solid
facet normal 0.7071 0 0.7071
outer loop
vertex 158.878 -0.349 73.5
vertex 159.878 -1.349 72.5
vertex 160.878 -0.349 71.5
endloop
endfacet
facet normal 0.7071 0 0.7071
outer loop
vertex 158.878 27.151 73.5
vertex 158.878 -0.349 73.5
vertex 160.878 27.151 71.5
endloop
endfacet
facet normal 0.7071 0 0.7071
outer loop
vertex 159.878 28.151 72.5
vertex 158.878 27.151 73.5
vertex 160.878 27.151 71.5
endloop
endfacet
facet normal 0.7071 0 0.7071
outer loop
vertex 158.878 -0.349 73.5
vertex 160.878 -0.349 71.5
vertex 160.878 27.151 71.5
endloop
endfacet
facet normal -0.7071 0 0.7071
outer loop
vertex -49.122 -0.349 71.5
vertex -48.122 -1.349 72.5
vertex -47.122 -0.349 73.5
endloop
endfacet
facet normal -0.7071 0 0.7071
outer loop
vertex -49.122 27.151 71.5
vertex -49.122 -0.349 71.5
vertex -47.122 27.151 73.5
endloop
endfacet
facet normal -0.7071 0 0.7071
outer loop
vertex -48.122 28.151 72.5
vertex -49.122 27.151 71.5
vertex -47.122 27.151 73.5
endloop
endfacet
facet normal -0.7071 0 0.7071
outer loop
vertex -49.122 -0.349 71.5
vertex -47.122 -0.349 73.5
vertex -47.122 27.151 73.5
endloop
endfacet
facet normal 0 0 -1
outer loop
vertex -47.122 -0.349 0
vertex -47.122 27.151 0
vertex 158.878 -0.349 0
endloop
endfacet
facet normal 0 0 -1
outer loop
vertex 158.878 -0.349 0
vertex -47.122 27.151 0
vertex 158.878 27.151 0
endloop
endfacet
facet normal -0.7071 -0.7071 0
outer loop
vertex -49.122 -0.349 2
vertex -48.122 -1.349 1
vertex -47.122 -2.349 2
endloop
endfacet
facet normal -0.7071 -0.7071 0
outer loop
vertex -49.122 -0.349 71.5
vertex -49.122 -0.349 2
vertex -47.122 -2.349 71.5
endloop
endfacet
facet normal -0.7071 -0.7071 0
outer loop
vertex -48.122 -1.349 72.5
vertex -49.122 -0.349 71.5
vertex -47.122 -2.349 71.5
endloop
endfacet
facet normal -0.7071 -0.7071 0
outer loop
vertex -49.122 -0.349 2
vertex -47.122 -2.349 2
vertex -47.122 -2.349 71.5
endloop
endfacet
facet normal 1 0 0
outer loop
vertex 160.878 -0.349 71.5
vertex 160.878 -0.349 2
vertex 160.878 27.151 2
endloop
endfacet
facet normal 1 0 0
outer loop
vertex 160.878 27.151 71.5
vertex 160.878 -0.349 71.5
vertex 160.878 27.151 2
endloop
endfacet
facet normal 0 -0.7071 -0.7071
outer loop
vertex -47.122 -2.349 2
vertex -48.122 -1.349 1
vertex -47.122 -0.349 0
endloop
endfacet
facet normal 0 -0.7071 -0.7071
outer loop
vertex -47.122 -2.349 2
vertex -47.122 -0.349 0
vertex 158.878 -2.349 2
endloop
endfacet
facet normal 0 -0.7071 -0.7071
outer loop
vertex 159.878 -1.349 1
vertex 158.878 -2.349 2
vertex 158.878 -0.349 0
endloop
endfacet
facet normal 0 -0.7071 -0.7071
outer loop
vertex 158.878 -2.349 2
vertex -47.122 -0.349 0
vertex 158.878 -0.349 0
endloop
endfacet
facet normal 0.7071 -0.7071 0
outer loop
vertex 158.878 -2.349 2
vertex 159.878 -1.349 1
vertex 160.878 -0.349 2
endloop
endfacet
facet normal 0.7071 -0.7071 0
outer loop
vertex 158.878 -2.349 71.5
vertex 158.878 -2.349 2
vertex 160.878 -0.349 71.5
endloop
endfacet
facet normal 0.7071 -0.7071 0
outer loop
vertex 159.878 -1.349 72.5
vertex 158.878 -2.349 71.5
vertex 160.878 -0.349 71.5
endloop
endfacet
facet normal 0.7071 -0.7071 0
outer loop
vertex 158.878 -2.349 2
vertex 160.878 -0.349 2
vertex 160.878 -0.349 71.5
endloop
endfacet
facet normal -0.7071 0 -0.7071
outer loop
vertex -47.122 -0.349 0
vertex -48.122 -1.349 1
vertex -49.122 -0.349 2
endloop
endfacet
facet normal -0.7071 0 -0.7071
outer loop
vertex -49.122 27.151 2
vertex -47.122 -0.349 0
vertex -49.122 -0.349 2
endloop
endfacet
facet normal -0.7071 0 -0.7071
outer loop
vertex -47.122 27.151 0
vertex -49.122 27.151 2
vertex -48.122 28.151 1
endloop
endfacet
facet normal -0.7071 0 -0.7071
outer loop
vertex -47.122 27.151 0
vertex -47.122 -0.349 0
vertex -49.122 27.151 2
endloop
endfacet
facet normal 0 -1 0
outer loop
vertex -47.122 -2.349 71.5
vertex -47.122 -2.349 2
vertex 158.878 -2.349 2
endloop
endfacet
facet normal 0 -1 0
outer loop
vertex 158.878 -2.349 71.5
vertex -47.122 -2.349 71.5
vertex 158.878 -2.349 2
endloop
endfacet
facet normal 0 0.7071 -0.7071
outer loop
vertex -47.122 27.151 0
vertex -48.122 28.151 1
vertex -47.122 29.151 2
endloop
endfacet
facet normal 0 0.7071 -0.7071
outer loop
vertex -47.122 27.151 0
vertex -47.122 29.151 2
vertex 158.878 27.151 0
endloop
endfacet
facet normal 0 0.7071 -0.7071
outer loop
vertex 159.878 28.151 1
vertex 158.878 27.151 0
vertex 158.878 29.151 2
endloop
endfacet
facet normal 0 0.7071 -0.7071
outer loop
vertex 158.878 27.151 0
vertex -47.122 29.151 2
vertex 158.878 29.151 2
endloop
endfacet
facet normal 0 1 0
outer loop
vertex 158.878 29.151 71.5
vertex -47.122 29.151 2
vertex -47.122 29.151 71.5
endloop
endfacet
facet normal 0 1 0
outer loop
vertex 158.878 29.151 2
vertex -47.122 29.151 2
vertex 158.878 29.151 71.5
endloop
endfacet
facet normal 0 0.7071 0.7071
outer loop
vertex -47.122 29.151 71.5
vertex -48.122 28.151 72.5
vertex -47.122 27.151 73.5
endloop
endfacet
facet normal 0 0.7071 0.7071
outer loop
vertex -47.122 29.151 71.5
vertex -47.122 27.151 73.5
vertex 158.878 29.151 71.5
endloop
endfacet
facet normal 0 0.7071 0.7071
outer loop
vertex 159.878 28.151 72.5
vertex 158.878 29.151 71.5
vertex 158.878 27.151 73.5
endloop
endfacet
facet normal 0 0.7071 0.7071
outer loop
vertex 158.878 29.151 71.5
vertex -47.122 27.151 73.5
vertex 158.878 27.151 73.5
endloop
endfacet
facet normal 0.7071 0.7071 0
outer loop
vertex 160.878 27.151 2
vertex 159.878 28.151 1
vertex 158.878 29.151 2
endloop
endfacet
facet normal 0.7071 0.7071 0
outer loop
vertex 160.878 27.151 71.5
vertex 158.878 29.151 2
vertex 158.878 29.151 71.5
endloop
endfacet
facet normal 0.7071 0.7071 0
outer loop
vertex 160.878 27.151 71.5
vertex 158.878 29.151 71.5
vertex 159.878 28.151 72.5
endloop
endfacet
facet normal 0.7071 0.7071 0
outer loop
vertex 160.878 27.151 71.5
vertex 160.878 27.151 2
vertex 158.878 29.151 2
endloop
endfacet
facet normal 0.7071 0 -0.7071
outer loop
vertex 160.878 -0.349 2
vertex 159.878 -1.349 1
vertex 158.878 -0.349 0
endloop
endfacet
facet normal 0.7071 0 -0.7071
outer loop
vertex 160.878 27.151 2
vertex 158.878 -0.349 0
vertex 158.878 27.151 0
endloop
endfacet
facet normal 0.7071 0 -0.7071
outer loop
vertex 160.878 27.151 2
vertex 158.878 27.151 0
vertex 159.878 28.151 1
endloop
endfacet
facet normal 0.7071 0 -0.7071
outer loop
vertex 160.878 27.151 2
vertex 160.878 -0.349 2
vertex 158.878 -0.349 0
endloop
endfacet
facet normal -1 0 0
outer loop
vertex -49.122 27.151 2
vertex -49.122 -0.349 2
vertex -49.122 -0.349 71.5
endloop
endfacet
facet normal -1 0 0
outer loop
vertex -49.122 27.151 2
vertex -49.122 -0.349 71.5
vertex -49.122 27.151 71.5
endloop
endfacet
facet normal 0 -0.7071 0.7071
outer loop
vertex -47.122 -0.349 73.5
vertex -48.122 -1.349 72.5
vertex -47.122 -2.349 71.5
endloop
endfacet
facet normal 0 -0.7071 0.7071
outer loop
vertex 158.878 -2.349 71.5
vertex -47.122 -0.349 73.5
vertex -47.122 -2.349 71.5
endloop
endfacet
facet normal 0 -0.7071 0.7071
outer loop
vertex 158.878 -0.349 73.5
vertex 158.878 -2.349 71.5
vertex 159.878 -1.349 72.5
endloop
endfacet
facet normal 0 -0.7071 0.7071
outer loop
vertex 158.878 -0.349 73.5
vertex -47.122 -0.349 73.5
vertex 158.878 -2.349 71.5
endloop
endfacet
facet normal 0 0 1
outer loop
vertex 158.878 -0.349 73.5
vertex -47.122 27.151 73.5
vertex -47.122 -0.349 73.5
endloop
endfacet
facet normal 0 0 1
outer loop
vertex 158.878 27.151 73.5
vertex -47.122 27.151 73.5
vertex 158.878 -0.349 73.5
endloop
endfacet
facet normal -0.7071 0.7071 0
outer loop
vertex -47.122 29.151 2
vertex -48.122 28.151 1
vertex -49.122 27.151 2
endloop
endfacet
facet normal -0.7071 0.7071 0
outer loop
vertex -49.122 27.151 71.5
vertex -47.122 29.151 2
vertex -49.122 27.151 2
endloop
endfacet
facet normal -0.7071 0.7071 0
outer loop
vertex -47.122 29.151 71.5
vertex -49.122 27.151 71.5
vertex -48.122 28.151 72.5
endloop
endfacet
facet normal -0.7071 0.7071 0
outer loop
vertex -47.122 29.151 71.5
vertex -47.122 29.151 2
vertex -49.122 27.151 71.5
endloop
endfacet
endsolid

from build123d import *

# Parameters (mm, degrees)
ESQUISSE1_W      = 210
ESQUISSE1_H      = 31.5
EXTRUSION1_DEPTH = 73.5
CHANFREIN1_SIZE  = 2
CHANFREIN2_SIZE  = 2
CHANFREIN3_SIZE  = 2


with BuildPart() as part:
    # Esquisse1 → Extrusion1 (new body)
    with BuildSketch(Plane.XY):
        with Locations((55.878134685, 13.401054852)):
            Rectangle(ESQUISSE1_W, ESQUISSE1_H)
    extrude(amount=EXTRUSION1_DEPTH)

    # Chanfrein1
    chanfrein1_edges = [part.edges().sort_by_distance(p)[0] for p in [
        (55.878134685, -2.348945148, 0),
        (55.878134685, -2.348945148, 73.5),
        (160.878134685, -2.348945148, 36.75),
        (-49.121865315, -2.348945148, 36.75),
    ]]
    chamfer(chanfrein1_edges, length=CHANFREIN1_SIZE)

    # Chanfrein2
    chanfrein2_edges = [part.edges().sort_by_distance(p)[0] for p in [
        (55.878134685, 29.151054852, 73.5),
        (55.878134685, 29.151054852, 0),
        (-49.121865315, 29.151054852, 36.75),
        (160.878134685, 29.151054852, 36.75),
    ]]
    chamfer(chanfrein2_edges, length=CHANFREIN2_SIZE)

    # Chanfrein3
    chanfrein3_edges = [part.edges().sort_by_distance(p)[0] for p in [
        (160.878134685, 13.401054852, 0),
        (160.878134685, 13.401054852, 73.5),
        (-49.121865315, 13.401054852, 0),
        (-49.121865315, 13.401054852, 73.5),
    ]]
    chamfer(chanfrein3_edges, length=CHANFREIN3_SIZE)


solid = part.part
